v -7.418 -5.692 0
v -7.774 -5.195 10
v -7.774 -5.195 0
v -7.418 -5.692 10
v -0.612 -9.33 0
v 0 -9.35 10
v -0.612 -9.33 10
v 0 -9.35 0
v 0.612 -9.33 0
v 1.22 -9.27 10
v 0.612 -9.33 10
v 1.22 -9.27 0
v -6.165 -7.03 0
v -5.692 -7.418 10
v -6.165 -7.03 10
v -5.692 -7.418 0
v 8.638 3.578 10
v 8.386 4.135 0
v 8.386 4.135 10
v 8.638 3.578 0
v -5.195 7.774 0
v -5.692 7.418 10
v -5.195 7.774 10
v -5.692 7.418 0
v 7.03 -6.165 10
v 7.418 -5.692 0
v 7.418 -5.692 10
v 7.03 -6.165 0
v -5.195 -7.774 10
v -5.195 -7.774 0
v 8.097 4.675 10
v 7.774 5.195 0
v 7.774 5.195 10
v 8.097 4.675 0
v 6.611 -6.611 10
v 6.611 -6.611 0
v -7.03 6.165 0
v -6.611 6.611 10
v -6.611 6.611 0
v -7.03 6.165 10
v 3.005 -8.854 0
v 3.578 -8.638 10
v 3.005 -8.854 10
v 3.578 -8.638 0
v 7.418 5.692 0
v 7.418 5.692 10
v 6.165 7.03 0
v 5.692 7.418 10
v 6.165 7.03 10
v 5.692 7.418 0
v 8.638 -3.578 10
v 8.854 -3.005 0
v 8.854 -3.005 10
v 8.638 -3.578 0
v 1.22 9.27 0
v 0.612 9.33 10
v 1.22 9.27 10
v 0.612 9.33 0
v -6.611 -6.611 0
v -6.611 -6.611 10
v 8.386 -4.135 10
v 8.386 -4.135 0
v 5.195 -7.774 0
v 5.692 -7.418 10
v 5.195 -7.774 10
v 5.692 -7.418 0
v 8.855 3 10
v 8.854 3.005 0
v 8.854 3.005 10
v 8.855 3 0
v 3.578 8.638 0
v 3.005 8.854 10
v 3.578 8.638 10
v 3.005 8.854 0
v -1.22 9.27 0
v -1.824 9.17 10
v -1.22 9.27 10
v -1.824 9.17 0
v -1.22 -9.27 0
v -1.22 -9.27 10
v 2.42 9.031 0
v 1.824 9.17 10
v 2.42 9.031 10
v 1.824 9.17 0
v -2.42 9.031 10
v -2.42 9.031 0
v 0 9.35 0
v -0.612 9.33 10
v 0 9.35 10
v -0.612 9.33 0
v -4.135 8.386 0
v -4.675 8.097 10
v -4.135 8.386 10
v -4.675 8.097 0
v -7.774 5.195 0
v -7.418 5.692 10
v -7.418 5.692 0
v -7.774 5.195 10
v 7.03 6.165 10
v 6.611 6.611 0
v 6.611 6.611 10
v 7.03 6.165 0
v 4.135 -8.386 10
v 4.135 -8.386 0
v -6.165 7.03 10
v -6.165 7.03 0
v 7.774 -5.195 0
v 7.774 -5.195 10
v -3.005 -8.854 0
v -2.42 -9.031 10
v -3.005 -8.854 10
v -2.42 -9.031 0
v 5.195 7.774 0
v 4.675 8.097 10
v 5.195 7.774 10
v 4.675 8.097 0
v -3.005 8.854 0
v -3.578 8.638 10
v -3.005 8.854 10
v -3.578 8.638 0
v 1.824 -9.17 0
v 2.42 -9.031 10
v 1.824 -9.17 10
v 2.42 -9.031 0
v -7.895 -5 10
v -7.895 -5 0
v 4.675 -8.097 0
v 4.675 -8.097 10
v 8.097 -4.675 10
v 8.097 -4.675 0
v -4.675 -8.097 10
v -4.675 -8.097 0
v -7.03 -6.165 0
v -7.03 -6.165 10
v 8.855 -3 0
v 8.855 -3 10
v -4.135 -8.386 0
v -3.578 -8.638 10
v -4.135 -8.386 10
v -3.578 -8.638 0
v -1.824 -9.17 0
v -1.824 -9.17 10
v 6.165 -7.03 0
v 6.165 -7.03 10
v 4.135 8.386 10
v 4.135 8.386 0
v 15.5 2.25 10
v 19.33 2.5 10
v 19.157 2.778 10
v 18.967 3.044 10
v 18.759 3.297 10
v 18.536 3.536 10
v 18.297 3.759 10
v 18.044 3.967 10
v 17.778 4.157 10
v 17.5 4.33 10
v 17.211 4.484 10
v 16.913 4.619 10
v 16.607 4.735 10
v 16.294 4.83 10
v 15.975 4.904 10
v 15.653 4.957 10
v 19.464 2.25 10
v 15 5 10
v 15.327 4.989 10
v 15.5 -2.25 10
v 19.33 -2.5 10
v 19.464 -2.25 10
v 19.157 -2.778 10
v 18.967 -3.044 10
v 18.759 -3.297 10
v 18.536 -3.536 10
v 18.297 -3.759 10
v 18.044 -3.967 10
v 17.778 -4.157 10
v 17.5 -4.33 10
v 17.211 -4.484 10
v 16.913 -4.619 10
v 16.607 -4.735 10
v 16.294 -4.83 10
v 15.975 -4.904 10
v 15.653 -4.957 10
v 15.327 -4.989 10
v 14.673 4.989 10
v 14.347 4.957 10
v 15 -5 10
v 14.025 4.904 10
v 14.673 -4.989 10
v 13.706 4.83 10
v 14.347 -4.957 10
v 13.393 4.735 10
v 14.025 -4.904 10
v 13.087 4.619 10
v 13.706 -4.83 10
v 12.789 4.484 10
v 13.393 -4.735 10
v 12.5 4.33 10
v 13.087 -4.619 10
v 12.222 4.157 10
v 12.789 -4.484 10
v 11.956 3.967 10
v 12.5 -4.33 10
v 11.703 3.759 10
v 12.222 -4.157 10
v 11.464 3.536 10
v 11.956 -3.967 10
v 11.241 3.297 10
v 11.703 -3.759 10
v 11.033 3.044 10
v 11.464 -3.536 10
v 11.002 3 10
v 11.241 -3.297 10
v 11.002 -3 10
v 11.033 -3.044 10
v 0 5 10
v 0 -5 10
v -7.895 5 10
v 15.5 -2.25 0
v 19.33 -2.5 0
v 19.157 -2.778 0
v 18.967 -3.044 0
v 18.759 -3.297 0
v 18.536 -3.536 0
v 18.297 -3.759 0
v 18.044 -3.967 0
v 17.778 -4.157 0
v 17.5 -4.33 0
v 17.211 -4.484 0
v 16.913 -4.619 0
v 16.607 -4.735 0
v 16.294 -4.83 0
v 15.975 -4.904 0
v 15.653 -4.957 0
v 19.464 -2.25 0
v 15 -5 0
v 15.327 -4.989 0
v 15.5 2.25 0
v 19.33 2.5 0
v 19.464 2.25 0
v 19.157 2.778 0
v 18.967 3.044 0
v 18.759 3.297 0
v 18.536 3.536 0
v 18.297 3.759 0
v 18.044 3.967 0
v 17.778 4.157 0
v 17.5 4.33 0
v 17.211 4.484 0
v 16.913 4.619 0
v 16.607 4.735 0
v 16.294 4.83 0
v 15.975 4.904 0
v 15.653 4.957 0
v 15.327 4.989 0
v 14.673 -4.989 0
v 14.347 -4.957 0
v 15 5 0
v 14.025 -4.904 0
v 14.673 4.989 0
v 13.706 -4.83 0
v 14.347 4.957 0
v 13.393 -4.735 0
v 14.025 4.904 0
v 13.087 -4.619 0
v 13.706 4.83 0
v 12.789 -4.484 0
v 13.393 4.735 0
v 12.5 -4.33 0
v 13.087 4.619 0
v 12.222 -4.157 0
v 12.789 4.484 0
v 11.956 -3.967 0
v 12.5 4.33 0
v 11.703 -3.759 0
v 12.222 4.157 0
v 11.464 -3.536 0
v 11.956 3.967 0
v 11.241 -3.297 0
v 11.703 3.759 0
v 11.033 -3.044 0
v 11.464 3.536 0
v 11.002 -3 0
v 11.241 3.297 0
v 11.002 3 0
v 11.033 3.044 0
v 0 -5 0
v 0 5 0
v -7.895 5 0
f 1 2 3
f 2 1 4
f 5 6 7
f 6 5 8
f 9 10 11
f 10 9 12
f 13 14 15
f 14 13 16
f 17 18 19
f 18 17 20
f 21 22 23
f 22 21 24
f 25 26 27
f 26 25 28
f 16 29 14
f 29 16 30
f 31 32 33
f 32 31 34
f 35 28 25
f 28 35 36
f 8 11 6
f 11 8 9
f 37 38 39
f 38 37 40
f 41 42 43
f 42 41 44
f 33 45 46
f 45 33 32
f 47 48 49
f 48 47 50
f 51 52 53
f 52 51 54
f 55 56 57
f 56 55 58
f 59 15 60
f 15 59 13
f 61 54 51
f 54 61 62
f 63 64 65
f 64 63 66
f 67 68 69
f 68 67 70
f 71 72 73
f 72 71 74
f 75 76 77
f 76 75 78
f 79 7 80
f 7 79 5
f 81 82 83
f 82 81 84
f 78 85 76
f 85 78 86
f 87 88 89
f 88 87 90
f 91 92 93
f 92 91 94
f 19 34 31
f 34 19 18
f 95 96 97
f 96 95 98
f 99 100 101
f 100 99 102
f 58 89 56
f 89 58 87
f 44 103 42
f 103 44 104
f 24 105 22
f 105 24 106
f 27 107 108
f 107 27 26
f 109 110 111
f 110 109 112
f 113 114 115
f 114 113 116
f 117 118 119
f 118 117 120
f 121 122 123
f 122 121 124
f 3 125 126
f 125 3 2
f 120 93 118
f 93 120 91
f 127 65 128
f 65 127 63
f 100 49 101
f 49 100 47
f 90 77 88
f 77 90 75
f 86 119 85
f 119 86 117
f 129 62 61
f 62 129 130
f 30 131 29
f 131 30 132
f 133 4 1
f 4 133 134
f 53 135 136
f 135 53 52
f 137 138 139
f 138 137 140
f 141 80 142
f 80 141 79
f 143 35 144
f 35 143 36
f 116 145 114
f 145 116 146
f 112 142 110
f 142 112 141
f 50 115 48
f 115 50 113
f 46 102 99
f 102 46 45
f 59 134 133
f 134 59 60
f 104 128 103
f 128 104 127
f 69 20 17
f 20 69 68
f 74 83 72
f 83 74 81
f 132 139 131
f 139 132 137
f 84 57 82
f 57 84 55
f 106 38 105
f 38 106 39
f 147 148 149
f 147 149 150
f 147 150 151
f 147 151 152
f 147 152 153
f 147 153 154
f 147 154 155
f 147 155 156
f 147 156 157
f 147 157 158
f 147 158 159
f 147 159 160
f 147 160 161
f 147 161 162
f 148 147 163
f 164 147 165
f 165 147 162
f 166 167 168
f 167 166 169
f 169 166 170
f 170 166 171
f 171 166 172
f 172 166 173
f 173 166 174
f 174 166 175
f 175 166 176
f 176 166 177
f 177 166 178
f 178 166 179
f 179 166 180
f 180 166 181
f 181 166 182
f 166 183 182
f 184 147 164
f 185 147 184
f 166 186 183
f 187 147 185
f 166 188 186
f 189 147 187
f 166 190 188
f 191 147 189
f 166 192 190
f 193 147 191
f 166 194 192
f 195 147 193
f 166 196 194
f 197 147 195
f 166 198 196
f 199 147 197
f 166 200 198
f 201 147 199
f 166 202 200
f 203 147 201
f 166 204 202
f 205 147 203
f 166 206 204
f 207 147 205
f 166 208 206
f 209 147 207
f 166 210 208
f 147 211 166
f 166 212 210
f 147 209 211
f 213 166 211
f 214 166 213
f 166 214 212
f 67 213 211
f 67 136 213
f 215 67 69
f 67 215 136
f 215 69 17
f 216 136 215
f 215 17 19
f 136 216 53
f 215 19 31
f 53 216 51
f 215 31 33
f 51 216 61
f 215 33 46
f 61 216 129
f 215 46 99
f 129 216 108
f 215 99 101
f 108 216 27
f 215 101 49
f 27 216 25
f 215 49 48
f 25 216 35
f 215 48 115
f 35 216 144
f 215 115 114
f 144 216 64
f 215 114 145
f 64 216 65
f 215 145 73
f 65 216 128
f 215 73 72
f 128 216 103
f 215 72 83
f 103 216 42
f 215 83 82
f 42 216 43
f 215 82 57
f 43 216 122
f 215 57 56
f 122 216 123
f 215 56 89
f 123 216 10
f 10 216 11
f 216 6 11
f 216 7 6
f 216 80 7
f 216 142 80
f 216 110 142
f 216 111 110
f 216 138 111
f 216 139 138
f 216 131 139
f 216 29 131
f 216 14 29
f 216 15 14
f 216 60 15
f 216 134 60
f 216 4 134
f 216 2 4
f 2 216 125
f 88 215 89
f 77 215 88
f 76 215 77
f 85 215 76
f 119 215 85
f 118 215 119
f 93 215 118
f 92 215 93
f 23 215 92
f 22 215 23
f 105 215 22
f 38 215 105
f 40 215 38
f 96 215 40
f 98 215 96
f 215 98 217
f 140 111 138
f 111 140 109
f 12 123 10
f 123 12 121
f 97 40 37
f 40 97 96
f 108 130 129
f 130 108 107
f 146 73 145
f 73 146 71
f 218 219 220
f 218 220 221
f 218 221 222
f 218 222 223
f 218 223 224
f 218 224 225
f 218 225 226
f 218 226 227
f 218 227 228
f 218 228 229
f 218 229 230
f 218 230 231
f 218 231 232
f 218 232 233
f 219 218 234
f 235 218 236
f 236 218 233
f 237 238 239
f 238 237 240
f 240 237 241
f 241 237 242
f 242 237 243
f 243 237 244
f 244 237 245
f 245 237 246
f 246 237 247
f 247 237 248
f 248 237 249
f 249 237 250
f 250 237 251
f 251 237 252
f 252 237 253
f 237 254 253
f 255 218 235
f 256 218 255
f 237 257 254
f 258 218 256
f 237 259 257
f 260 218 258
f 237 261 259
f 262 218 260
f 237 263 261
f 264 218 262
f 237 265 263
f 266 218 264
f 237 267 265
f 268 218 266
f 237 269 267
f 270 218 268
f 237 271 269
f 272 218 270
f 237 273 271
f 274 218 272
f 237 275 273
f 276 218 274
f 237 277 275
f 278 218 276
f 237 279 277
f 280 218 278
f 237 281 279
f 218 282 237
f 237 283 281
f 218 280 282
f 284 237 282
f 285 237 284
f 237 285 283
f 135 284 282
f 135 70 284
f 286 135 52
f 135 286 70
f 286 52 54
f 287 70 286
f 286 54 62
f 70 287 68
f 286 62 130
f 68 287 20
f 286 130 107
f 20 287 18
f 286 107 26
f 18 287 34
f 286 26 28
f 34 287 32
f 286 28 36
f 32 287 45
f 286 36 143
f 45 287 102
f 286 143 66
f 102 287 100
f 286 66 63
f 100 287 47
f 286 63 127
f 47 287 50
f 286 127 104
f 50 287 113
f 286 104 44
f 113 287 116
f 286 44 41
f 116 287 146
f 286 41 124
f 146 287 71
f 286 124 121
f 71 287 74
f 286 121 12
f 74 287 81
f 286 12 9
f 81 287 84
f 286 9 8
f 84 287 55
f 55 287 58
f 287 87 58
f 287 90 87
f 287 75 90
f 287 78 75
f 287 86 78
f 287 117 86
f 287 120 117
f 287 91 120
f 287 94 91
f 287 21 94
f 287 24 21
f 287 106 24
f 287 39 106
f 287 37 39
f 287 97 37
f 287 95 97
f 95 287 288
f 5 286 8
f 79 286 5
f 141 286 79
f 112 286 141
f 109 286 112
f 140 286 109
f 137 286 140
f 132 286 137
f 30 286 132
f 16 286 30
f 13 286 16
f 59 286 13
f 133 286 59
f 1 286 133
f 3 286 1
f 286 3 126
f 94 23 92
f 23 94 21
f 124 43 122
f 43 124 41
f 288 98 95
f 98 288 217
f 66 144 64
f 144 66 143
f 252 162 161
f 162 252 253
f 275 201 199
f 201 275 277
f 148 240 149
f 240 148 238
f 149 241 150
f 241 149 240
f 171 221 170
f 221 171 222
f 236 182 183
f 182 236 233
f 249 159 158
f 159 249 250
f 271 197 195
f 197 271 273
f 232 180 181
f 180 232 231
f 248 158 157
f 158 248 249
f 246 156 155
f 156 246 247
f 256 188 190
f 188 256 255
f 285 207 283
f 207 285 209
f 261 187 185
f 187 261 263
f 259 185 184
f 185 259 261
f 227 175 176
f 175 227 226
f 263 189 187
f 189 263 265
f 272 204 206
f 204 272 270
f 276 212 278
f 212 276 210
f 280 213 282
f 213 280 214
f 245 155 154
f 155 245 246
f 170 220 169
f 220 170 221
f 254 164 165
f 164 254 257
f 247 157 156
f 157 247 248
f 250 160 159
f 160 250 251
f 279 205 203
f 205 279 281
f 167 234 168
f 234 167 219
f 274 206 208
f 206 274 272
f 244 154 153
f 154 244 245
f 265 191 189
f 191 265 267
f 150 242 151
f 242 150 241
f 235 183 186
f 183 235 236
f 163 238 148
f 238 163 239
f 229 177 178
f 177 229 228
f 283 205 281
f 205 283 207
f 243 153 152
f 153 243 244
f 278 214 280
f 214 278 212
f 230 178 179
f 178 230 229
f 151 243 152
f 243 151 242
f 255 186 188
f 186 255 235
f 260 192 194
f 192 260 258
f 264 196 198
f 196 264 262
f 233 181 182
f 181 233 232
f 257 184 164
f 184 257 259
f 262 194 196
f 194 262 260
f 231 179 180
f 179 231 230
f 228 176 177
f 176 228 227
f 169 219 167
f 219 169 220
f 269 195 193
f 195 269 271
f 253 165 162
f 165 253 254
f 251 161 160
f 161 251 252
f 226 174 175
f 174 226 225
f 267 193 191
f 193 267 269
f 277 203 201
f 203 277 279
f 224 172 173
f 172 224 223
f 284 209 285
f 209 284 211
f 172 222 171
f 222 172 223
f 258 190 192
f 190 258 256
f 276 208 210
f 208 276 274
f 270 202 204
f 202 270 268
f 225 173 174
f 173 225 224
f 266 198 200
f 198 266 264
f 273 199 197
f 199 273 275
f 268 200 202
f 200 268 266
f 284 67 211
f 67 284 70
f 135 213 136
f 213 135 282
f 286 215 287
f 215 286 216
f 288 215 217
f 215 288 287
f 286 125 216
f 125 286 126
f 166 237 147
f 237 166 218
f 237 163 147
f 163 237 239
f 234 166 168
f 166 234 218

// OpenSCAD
// Tubing clip for 12.7 mm lab stand rod
// Print orientation: flat on bed, extrusion along +Z

$fn = 96;

// ---- Dimensions (mm) ----
rod_d      = 12.7;   // rod diameter
ring_w     = 3;      // rod ring wall thickness
rod_r      = rod_d/2 + ring_w;  // rod ring outer radius (18.7/2)
opening_w  = 10;     // rod ring opening width (along -X)

tube_d     = 6;      // tubing inner diameter
tube_w     = 2;      // tubing wall thickness
tube_r     = tube_d/2 + tube_w;  // tubing outer radius
tube_x     = 15;     // tubing ring centre X
tube_open  = 4.5;    // tubing opening width (along +X)

bridge_w   = 6;      // bridge width (Y)
bridge_x1  = 8;      // bridge start X
bridge_x2  = 12;     // bridge end X

eps        = 0.5;    // cut overshoot

// ---- Model ----
difference() {
    union() {
        // Rod ring
        cylinder(r = rod_r, h = 10);
        // Tubing ring
        translate([tube_x, 0, 0])
            cylinder(r = tube_r, h = 10);
        // Bridge
        translate([bridge_x1, -bridge_w/2, 0])
            cube([bridge_x2 - bridge_x1, bridge_w, 10]);
    }
    // Rod opening (-X side)
    translate([-rod_r - eps, -opening_w/2, 0])
        cube([rod_r + eps, opening_w, 10]);
    // Tubing opening (+X side)
    translate([tube_x + eps, -tube_open/2, 0])
        cube([rod_r + 2*eps, tube_open, 10]);
}
